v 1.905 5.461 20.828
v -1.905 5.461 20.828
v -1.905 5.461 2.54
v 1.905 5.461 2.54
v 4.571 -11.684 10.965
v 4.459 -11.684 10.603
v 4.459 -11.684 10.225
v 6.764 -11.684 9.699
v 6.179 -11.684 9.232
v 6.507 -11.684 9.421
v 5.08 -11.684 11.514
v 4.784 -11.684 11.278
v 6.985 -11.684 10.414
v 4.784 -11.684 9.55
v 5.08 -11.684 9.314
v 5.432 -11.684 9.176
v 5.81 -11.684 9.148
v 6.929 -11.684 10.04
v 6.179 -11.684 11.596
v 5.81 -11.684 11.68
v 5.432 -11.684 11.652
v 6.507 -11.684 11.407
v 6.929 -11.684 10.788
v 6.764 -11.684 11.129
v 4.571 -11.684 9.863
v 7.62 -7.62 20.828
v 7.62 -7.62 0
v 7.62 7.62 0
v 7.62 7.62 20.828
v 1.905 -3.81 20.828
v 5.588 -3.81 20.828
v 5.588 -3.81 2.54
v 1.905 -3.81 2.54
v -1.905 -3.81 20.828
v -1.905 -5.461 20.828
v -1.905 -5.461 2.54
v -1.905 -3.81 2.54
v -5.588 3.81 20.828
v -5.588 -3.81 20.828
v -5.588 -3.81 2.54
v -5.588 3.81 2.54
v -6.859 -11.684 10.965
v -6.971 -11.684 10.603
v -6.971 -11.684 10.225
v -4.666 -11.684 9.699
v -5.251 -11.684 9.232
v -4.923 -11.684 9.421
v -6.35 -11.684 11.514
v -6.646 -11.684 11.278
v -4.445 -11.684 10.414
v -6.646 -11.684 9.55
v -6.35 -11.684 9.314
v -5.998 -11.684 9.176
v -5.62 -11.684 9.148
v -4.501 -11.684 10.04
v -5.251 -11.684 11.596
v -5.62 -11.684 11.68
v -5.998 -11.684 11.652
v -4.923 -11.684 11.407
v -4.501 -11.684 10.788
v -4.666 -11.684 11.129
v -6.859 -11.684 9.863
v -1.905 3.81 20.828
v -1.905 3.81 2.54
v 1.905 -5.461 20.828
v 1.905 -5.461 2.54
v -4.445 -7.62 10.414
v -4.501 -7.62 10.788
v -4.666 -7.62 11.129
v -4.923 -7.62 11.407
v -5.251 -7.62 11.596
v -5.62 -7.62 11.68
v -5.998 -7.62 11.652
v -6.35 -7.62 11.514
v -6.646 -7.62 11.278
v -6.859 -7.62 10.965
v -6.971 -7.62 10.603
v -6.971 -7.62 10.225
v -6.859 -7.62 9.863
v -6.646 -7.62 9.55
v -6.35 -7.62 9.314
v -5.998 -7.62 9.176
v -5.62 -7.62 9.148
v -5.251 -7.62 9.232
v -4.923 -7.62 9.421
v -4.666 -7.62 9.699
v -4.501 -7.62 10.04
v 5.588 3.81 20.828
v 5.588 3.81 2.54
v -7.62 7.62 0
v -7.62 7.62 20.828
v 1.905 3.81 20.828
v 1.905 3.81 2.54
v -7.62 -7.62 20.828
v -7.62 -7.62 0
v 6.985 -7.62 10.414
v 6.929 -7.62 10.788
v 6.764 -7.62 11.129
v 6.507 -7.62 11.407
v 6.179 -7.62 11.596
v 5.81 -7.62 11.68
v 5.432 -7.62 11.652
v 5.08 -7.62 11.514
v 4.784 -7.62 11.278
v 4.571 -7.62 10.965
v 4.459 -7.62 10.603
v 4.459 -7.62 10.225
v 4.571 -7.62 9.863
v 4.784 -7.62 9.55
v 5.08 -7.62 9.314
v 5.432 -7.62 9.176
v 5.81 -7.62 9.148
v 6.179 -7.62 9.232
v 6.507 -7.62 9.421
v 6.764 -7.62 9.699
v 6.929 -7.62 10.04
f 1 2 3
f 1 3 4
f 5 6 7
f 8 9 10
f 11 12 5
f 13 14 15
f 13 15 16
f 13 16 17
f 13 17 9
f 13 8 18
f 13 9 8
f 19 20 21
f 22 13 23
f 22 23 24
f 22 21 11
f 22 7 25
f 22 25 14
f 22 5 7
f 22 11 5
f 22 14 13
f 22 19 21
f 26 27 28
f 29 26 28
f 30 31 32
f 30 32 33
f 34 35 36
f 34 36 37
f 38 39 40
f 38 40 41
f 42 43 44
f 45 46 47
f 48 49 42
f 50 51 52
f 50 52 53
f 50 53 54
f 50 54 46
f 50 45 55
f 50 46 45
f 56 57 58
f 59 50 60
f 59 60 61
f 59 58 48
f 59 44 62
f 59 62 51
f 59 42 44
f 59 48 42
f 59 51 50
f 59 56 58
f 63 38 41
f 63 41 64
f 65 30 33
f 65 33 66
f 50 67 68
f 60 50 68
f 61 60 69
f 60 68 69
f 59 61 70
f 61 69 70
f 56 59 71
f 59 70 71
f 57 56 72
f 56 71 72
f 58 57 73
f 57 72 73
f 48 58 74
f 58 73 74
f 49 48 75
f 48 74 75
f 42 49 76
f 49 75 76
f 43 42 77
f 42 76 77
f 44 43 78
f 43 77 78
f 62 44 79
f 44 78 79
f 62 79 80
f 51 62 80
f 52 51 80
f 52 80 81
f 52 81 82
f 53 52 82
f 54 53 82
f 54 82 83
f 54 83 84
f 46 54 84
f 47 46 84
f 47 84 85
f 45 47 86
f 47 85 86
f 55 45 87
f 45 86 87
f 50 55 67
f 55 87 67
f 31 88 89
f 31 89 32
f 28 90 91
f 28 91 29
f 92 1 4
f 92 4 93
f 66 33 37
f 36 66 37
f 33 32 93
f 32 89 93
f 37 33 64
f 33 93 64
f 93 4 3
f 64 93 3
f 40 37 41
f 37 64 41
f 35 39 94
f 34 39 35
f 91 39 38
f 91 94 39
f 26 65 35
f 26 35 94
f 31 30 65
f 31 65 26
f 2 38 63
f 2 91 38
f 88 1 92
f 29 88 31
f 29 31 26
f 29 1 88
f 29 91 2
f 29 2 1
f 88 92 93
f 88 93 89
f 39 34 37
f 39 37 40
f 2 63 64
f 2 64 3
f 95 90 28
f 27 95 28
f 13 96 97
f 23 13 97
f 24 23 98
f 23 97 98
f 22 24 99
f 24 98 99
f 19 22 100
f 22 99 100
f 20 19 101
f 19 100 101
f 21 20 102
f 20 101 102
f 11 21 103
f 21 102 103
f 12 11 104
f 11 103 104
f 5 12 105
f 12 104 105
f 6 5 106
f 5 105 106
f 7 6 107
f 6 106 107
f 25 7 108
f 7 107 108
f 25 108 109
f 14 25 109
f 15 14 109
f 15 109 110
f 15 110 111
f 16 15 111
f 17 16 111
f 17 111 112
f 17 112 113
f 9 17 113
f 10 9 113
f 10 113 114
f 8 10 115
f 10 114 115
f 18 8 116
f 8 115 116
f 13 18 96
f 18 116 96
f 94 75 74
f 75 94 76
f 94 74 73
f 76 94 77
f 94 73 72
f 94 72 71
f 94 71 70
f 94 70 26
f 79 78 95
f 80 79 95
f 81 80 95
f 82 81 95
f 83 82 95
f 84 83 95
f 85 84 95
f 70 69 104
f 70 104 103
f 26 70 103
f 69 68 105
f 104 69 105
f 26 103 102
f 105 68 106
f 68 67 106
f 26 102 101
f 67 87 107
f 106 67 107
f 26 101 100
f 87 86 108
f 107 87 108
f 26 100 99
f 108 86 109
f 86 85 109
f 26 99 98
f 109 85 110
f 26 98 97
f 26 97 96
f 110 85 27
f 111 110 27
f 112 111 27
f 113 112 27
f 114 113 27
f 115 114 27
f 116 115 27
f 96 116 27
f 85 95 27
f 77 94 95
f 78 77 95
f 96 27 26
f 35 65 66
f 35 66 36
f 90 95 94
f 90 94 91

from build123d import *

# Parameters (mm, degrees)
SKETCH1_W           = 15.24
SKETCH1_H           = 15.24
BOSS_EXTRUDE1_DEPTH = 20.828
CUT_EXTRUDE1_DEPTH  = 18.288
SKETCH3_R           = 1.27
BOSS_EXTRUDE2_DEPTH = 4.064


with BuildPart() as part:
    # Sketch1 → Boss-Extrude1 (new body)
    with BuildSketch(Plane.XY):
        Rectangle(SKETCH1_W, SKETCH1_H)
    extrude(amount=BOSS_EXTRUDE1_DEPTH)

    # Sketch2 → Cut-Extrude1 (cut)
    with BuildSketch(Plane.XY.offset(20.828)):
        Polygon((5.588, -3.81), (1.905, -3.81), (1.905, -5.461), (-1.905, -5.461), (-1.905, -3.81), (-5.588, -3.81), (-5.588, 3.81), (-1.905, 3.81), (-1.905, 5.461), (1.905, 5.461), (1.905, 3.81), (5.588, 3.81), align=None)
    extrude(amount=-CUT_EXTRUDE1_DEPTH, mode=Mode.SUBTRACT)

    # Sketch3 → Boss-Extrude2 (add)
    with BuildSketch(Plane.XZ.offset(7.62)):
        with Locations((-5.715, 10.414)):
            Circle(SKETCH3_R)
        with Locations((5.715, 10.414)):
            Circle(SKETCH3_R)
    extrude(amount=BOSS_EXTRUDE2_DEPTH)


solid = part.part
